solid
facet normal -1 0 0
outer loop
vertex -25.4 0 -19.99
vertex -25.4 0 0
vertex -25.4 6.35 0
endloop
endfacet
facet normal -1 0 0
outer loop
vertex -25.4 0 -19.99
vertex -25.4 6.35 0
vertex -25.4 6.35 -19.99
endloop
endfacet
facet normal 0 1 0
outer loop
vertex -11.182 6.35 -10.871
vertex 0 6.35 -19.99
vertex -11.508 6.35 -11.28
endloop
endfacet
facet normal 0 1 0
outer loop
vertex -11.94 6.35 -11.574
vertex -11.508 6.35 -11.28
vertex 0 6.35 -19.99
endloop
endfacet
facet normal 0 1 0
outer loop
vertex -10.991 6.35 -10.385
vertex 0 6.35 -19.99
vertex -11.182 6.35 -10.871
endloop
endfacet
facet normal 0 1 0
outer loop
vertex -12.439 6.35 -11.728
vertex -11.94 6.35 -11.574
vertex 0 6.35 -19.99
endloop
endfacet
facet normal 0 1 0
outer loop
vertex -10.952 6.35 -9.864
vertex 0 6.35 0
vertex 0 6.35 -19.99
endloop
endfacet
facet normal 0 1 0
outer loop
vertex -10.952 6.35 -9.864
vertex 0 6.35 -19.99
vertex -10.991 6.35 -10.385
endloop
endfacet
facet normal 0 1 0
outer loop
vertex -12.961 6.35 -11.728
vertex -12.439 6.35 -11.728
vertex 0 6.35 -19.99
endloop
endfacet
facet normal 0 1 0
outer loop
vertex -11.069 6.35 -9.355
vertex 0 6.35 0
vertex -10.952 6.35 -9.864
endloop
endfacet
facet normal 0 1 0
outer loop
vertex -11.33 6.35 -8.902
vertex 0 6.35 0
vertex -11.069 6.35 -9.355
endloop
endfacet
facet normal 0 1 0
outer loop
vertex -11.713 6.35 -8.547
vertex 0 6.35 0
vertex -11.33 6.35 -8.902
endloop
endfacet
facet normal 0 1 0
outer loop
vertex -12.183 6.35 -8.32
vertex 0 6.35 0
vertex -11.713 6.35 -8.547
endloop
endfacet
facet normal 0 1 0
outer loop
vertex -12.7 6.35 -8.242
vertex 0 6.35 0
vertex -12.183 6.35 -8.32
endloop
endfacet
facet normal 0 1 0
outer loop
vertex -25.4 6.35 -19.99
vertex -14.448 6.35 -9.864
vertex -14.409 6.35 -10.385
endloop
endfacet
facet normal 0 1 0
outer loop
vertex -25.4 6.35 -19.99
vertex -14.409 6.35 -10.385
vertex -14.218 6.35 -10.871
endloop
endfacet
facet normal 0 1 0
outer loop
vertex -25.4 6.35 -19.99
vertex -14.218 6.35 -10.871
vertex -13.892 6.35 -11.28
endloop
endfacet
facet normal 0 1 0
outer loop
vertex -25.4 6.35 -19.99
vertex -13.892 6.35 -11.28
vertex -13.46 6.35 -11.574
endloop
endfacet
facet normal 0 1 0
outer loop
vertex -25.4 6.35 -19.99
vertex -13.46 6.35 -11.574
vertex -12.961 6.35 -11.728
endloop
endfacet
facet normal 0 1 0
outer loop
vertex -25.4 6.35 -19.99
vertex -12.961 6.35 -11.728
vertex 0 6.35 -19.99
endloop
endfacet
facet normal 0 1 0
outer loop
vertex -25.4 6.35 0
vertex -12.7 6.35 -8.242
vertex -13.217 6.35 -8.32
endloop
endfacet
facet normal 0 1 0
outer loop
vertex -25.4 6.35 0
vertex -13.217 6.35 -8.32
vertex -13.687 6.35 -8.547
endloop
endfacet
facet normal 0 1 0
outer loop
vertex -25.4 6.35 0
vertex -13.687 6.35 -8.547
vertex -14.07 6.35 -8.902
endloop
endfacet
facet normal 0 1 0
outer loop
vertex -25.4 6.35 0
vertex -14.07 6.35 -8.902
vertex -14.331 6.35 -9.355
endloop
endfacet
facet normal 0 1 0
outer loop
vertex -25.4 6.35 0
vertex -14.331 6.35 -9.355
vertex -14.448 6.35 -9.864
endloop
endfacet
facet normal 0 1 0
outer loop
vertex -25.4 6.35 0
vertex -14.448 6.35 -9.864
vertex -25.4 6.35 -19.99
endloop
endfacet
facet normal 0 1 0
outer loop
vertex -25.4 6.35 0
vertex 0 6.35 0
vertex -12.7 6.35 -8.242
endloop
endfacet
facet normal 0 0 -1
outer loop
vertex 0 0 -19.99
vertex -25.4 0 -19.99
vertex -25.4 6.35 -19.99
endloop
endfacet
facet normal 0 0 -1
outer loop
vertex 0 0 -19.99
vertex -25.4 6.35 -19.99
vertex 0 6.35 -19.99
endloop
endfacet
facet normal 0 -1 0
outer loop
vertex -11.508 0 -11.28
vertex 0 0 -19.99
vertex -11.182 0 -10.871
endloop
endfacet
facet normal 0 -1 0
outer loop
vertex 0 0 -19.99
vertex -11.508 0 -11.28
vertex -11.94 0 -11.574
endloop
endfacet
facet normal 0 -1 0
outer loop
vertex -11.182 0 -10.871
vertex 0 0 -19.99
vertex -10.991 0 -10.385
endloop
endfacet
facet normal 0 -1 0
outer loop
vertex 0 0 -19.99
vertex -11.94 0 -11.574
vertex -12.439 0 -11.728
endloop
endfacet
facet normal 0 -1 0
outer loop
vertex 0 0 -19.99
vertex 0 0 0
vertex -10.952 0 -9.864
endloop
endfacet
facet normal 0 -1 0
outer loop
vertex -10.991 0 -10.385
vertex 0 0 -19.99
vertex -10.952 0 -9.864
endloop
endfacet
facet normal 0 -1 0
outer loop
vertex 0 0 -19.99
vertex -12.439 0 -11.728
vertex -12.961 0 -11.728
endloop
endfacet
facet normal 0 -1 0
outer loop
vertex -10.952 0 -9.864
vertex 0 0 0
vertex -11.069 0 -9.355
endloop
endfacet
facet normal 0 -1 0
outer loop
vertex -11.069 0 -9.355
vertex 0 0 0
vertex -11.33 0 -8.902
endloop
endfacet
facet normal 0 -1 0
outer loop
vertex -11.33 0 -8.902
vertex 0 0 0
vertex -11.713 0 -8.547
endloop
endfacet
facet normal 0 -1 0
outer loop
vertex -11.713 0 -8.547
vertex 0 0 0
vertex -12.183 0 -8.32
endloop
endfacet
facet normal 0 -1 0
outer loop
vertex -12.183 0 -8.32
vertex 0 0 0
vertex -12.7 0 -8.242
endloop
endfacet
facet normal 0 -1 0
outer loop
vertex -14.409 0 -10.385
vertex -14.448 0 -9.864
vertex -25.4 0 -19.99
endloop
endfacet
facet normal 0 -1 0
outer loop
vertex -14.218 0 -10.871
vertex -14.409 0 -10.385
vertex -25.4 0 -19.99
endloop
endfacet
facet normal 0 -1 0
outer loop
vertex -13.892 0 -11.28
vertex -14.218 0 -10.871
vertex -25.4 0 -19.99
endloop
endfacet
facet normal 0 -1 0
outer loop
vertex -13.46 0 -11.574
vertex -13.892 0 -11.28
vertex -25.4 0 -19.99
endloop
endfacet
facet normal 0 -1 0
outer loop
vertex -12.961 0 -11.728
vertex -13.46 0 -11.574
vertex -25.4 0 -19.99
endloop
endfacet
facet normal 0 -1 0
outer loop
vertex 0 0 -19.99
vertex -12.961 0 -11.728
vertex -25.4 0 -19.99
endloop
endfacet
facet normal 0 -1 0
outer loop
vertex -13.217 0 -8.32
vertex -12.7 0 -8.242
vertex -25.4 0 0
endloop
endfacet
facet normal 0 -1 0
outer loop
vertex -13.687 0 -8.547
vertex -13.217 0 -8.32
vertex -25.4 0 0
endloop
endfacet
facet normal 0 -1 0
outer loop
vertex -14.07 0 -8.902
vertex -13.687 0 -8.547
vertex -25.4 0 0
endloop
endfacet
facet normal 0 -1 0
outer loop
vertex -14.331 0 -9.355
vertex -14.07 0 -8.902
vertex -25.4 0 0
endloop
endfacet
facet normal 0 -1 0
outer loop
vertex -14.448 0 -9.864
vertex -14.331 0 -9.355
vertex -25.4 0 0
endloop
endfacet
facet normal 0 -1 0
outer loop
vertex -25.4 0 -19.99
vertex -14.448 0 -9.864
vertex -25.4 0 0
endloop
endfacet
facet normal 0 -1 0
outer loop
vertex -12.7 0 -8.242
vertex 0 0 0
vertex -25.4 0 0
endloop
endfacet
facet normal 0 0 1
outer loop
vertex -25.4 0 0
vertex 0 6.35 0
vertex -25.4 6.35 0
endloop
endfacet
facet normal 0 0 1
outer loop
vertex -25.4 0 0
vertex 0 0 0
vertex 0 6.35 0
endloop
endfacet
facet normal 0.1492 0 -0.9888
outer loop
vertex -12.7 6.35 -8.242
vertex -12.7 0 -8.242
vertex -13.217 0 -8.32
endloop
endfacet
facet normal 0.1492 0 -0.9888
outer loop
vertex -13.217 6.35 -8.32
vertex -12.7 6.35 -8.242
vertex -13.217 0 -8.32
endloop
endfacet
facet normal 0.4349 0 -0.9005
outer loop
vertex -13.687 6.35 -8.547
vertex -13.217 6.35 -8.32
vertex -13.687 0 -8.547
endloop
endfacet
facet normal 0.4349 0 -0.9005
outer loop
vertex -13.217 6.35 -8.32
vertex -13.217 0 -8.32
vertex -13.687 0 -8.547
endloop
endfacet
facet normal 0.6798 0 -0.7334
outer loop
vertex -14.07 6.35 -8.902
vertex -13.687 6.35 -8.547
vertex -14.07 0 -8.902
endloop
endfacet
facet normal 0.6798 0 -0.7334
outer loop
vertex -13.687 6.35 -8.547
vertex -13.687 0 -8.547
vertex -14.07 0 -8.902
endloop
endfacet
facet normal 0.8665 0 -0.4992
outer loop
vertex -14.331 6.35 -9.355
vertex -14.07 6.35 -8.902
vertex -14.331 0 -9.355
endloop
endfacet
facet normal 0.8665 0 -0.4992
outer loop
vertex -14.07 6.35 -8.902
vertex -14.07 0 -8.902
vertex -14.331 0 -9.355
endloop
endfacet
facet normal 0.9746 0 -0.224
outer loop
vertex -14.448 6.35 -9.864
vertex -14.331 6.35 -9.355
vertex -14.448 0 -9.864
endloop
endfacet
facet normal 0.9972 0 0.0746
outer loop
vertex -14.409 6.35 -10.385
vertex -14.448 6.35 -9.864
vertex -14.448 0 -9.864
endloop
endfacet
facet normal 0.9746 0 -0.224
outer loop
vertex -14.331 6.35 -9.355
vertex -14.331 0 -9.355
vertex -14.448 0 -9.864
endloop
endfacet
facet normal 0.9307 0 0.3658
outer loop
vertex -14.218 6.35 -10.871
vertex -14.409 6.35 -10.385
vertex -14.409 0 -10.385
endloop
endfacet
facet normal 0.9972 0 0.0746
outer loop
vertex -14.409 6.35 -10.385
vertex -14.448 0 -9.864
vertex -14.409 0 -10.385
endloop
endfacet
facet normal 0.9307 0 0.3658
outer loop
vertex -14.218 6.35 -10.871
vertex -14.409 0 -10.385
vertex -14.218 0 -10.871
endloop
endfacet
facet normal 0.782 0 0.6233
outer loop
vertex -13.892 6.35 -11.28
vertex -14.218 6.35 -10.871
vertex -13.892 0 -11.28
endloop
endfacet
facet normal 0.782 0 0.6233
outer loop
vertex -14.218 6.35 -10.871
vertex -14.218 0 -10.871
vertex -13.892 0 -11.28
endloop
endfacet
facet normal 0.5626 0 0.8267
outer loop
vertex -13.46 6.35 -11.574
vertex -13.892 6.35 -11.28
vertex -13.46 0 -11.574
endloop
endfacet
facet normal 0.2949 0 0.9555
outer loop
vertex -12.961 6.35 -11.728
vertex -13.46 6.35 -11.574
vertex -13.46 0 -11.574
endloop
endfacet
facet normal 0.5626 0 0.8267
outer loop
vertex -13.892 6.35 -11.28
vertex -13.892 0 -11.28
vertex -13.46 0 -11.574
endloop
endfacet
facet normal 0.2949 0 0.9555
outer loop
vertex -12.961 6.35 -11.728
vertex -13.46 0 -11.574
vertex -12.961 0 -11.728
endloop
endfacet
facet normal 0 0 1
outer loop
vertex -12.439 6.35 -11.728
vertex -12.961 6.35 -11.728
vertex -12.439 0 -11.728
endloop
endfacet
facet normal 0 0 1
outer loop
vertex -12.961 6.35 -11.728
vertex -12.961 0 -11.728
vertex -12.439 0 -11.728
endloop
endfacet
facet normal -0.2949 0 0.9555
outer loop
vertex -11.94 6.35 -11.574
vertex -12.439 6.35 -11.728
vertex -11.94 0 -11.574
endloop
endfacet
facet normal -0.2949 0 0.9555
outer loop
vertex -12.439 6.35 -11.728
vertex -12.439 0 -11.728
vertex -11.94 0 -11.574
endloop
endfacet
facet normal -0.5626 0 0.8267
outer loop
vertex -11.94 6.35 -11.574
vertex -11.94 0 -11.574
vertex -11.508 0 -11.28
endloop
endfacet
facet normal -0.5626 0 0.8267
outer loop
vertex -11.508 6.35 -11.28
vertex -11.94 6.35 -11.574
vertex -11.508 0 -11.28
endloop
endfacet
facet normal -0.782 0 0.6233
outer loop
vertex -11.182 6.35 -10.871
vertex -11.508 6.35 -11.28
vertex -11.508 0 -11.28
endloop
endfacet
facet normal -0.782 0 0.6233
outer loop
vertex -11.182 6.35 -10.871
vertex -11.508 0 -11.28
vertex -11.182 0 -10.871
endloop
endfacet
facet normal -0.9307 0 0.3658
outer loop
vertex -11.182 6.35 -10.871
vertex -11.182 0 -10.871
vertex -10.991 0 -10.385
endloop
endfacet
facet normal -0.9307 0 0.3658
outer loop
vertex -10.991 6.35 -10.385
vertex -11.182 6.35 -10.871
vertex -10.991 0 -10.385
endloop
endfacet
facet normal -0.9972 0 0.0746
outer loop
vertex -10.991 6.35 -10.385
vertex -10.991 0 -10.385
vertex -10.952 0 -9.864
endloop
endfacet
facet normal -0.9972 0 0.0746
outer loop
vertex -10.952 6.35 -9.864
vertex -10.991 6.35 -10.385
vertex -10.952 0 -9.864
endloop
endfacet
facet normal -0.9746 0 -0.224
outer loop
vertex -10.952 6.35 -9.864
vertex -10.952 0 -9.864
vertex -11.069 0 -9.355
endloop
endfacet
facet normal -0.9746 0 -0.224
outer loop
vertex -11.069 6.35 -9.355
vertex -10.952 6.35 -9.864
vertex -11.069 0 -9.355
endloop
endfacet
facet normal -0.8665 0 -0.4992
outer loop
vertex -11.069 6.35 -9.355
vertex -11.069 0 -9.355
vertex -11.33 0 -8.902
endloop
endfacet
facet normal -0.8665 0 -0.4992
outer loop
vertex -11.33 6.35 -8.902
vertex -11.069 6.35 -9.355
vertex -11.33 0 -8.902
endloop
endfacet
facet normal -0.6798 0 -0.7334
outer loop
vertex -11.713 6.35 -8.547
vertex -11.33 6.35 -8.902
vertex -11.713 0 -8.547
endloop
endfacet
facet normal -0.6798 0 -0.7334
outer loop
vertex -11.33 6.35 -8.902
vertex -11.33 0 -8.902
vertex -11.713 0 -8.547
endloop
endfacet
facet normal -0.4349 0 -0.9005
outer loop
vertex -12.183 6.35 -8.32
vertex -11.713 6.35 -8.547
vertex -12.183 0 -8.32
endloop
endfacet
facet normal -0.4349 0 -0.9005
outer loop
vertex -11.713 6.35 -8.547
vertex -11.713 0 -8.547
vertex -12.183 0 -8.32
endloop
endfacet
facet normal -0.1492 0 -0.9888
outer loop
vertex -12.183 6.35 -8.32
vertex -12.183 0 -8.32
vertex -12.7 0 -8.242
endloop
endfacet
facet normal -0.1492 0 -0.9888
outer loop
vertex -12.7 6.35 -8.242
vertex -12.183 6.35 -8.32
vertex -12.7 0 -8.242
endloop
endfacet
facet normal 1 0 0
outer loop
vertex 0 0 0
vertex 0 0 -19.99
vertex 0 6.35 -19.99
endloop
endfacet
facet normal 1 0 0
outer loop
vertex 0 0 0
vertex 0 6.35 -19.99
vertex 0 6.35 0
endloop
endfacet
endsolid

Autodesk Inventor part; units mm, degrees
ref_plane "YZ Plane" through (0, 0, 0) normal (1, 0, 0) x (0, 1, 0)
ref_plane "XZ Plane" through (0, 0, 0) normal (0, 1, 0) x (-1, 0, 0)
ref_plane "XY Plane" through (0, 0, 0) normal (0, 0, 1) x (1, 0, 0)
sketch "Sketch1" plane through (0, 0, 0) normal (0, 1, 0) x (-1, 0, 0)
  line L0 (0, 0) -> (25.4, 0)
  line L1 (25.4, 0) -> (25.4, -19.9898)
  line L2 (25.4, -19.9898) -> (0, -19.9898)
  line L3 (0, -19.9898) -> (0, 0)
  dimension "d0" = 25.4
  dimension "d1" = 19.9898
extrude "Extrusion1" add sketch "Sketch1" along normal blind 6.35
sketch "Sketch2" plane through (0, 6.35, 0) normal (0, 1, 0) x (1, 0, 0)
  line L0 (-25.4, 0) -> (0, 0) projected
  line L1 (0, 0) -> (0, 19.9898) projected
  line L2 (0, 19.9898) -> (-25.4, 19.9898) projected
  line L3 (-25.4, 19.9898) -> (-25.4, 0) projected
  point P0 (-12.7, 9.9949)
  dimension "d4" = 19.9898
  dimension "d5" = 25.4
  dimension "d6" = 12.7
  dimension "d7" = 9.9949
hole "Hole1" at (-12.7, 6.35, -9.9949) direction (0, -1, 0) diameter 3.5052 end through all
equation "\"d6\" = 0.5 * d5"
equation "\"d7\" = 0.5 * d4"
properties part number "SINGLE HOLE CONNECTOR"
